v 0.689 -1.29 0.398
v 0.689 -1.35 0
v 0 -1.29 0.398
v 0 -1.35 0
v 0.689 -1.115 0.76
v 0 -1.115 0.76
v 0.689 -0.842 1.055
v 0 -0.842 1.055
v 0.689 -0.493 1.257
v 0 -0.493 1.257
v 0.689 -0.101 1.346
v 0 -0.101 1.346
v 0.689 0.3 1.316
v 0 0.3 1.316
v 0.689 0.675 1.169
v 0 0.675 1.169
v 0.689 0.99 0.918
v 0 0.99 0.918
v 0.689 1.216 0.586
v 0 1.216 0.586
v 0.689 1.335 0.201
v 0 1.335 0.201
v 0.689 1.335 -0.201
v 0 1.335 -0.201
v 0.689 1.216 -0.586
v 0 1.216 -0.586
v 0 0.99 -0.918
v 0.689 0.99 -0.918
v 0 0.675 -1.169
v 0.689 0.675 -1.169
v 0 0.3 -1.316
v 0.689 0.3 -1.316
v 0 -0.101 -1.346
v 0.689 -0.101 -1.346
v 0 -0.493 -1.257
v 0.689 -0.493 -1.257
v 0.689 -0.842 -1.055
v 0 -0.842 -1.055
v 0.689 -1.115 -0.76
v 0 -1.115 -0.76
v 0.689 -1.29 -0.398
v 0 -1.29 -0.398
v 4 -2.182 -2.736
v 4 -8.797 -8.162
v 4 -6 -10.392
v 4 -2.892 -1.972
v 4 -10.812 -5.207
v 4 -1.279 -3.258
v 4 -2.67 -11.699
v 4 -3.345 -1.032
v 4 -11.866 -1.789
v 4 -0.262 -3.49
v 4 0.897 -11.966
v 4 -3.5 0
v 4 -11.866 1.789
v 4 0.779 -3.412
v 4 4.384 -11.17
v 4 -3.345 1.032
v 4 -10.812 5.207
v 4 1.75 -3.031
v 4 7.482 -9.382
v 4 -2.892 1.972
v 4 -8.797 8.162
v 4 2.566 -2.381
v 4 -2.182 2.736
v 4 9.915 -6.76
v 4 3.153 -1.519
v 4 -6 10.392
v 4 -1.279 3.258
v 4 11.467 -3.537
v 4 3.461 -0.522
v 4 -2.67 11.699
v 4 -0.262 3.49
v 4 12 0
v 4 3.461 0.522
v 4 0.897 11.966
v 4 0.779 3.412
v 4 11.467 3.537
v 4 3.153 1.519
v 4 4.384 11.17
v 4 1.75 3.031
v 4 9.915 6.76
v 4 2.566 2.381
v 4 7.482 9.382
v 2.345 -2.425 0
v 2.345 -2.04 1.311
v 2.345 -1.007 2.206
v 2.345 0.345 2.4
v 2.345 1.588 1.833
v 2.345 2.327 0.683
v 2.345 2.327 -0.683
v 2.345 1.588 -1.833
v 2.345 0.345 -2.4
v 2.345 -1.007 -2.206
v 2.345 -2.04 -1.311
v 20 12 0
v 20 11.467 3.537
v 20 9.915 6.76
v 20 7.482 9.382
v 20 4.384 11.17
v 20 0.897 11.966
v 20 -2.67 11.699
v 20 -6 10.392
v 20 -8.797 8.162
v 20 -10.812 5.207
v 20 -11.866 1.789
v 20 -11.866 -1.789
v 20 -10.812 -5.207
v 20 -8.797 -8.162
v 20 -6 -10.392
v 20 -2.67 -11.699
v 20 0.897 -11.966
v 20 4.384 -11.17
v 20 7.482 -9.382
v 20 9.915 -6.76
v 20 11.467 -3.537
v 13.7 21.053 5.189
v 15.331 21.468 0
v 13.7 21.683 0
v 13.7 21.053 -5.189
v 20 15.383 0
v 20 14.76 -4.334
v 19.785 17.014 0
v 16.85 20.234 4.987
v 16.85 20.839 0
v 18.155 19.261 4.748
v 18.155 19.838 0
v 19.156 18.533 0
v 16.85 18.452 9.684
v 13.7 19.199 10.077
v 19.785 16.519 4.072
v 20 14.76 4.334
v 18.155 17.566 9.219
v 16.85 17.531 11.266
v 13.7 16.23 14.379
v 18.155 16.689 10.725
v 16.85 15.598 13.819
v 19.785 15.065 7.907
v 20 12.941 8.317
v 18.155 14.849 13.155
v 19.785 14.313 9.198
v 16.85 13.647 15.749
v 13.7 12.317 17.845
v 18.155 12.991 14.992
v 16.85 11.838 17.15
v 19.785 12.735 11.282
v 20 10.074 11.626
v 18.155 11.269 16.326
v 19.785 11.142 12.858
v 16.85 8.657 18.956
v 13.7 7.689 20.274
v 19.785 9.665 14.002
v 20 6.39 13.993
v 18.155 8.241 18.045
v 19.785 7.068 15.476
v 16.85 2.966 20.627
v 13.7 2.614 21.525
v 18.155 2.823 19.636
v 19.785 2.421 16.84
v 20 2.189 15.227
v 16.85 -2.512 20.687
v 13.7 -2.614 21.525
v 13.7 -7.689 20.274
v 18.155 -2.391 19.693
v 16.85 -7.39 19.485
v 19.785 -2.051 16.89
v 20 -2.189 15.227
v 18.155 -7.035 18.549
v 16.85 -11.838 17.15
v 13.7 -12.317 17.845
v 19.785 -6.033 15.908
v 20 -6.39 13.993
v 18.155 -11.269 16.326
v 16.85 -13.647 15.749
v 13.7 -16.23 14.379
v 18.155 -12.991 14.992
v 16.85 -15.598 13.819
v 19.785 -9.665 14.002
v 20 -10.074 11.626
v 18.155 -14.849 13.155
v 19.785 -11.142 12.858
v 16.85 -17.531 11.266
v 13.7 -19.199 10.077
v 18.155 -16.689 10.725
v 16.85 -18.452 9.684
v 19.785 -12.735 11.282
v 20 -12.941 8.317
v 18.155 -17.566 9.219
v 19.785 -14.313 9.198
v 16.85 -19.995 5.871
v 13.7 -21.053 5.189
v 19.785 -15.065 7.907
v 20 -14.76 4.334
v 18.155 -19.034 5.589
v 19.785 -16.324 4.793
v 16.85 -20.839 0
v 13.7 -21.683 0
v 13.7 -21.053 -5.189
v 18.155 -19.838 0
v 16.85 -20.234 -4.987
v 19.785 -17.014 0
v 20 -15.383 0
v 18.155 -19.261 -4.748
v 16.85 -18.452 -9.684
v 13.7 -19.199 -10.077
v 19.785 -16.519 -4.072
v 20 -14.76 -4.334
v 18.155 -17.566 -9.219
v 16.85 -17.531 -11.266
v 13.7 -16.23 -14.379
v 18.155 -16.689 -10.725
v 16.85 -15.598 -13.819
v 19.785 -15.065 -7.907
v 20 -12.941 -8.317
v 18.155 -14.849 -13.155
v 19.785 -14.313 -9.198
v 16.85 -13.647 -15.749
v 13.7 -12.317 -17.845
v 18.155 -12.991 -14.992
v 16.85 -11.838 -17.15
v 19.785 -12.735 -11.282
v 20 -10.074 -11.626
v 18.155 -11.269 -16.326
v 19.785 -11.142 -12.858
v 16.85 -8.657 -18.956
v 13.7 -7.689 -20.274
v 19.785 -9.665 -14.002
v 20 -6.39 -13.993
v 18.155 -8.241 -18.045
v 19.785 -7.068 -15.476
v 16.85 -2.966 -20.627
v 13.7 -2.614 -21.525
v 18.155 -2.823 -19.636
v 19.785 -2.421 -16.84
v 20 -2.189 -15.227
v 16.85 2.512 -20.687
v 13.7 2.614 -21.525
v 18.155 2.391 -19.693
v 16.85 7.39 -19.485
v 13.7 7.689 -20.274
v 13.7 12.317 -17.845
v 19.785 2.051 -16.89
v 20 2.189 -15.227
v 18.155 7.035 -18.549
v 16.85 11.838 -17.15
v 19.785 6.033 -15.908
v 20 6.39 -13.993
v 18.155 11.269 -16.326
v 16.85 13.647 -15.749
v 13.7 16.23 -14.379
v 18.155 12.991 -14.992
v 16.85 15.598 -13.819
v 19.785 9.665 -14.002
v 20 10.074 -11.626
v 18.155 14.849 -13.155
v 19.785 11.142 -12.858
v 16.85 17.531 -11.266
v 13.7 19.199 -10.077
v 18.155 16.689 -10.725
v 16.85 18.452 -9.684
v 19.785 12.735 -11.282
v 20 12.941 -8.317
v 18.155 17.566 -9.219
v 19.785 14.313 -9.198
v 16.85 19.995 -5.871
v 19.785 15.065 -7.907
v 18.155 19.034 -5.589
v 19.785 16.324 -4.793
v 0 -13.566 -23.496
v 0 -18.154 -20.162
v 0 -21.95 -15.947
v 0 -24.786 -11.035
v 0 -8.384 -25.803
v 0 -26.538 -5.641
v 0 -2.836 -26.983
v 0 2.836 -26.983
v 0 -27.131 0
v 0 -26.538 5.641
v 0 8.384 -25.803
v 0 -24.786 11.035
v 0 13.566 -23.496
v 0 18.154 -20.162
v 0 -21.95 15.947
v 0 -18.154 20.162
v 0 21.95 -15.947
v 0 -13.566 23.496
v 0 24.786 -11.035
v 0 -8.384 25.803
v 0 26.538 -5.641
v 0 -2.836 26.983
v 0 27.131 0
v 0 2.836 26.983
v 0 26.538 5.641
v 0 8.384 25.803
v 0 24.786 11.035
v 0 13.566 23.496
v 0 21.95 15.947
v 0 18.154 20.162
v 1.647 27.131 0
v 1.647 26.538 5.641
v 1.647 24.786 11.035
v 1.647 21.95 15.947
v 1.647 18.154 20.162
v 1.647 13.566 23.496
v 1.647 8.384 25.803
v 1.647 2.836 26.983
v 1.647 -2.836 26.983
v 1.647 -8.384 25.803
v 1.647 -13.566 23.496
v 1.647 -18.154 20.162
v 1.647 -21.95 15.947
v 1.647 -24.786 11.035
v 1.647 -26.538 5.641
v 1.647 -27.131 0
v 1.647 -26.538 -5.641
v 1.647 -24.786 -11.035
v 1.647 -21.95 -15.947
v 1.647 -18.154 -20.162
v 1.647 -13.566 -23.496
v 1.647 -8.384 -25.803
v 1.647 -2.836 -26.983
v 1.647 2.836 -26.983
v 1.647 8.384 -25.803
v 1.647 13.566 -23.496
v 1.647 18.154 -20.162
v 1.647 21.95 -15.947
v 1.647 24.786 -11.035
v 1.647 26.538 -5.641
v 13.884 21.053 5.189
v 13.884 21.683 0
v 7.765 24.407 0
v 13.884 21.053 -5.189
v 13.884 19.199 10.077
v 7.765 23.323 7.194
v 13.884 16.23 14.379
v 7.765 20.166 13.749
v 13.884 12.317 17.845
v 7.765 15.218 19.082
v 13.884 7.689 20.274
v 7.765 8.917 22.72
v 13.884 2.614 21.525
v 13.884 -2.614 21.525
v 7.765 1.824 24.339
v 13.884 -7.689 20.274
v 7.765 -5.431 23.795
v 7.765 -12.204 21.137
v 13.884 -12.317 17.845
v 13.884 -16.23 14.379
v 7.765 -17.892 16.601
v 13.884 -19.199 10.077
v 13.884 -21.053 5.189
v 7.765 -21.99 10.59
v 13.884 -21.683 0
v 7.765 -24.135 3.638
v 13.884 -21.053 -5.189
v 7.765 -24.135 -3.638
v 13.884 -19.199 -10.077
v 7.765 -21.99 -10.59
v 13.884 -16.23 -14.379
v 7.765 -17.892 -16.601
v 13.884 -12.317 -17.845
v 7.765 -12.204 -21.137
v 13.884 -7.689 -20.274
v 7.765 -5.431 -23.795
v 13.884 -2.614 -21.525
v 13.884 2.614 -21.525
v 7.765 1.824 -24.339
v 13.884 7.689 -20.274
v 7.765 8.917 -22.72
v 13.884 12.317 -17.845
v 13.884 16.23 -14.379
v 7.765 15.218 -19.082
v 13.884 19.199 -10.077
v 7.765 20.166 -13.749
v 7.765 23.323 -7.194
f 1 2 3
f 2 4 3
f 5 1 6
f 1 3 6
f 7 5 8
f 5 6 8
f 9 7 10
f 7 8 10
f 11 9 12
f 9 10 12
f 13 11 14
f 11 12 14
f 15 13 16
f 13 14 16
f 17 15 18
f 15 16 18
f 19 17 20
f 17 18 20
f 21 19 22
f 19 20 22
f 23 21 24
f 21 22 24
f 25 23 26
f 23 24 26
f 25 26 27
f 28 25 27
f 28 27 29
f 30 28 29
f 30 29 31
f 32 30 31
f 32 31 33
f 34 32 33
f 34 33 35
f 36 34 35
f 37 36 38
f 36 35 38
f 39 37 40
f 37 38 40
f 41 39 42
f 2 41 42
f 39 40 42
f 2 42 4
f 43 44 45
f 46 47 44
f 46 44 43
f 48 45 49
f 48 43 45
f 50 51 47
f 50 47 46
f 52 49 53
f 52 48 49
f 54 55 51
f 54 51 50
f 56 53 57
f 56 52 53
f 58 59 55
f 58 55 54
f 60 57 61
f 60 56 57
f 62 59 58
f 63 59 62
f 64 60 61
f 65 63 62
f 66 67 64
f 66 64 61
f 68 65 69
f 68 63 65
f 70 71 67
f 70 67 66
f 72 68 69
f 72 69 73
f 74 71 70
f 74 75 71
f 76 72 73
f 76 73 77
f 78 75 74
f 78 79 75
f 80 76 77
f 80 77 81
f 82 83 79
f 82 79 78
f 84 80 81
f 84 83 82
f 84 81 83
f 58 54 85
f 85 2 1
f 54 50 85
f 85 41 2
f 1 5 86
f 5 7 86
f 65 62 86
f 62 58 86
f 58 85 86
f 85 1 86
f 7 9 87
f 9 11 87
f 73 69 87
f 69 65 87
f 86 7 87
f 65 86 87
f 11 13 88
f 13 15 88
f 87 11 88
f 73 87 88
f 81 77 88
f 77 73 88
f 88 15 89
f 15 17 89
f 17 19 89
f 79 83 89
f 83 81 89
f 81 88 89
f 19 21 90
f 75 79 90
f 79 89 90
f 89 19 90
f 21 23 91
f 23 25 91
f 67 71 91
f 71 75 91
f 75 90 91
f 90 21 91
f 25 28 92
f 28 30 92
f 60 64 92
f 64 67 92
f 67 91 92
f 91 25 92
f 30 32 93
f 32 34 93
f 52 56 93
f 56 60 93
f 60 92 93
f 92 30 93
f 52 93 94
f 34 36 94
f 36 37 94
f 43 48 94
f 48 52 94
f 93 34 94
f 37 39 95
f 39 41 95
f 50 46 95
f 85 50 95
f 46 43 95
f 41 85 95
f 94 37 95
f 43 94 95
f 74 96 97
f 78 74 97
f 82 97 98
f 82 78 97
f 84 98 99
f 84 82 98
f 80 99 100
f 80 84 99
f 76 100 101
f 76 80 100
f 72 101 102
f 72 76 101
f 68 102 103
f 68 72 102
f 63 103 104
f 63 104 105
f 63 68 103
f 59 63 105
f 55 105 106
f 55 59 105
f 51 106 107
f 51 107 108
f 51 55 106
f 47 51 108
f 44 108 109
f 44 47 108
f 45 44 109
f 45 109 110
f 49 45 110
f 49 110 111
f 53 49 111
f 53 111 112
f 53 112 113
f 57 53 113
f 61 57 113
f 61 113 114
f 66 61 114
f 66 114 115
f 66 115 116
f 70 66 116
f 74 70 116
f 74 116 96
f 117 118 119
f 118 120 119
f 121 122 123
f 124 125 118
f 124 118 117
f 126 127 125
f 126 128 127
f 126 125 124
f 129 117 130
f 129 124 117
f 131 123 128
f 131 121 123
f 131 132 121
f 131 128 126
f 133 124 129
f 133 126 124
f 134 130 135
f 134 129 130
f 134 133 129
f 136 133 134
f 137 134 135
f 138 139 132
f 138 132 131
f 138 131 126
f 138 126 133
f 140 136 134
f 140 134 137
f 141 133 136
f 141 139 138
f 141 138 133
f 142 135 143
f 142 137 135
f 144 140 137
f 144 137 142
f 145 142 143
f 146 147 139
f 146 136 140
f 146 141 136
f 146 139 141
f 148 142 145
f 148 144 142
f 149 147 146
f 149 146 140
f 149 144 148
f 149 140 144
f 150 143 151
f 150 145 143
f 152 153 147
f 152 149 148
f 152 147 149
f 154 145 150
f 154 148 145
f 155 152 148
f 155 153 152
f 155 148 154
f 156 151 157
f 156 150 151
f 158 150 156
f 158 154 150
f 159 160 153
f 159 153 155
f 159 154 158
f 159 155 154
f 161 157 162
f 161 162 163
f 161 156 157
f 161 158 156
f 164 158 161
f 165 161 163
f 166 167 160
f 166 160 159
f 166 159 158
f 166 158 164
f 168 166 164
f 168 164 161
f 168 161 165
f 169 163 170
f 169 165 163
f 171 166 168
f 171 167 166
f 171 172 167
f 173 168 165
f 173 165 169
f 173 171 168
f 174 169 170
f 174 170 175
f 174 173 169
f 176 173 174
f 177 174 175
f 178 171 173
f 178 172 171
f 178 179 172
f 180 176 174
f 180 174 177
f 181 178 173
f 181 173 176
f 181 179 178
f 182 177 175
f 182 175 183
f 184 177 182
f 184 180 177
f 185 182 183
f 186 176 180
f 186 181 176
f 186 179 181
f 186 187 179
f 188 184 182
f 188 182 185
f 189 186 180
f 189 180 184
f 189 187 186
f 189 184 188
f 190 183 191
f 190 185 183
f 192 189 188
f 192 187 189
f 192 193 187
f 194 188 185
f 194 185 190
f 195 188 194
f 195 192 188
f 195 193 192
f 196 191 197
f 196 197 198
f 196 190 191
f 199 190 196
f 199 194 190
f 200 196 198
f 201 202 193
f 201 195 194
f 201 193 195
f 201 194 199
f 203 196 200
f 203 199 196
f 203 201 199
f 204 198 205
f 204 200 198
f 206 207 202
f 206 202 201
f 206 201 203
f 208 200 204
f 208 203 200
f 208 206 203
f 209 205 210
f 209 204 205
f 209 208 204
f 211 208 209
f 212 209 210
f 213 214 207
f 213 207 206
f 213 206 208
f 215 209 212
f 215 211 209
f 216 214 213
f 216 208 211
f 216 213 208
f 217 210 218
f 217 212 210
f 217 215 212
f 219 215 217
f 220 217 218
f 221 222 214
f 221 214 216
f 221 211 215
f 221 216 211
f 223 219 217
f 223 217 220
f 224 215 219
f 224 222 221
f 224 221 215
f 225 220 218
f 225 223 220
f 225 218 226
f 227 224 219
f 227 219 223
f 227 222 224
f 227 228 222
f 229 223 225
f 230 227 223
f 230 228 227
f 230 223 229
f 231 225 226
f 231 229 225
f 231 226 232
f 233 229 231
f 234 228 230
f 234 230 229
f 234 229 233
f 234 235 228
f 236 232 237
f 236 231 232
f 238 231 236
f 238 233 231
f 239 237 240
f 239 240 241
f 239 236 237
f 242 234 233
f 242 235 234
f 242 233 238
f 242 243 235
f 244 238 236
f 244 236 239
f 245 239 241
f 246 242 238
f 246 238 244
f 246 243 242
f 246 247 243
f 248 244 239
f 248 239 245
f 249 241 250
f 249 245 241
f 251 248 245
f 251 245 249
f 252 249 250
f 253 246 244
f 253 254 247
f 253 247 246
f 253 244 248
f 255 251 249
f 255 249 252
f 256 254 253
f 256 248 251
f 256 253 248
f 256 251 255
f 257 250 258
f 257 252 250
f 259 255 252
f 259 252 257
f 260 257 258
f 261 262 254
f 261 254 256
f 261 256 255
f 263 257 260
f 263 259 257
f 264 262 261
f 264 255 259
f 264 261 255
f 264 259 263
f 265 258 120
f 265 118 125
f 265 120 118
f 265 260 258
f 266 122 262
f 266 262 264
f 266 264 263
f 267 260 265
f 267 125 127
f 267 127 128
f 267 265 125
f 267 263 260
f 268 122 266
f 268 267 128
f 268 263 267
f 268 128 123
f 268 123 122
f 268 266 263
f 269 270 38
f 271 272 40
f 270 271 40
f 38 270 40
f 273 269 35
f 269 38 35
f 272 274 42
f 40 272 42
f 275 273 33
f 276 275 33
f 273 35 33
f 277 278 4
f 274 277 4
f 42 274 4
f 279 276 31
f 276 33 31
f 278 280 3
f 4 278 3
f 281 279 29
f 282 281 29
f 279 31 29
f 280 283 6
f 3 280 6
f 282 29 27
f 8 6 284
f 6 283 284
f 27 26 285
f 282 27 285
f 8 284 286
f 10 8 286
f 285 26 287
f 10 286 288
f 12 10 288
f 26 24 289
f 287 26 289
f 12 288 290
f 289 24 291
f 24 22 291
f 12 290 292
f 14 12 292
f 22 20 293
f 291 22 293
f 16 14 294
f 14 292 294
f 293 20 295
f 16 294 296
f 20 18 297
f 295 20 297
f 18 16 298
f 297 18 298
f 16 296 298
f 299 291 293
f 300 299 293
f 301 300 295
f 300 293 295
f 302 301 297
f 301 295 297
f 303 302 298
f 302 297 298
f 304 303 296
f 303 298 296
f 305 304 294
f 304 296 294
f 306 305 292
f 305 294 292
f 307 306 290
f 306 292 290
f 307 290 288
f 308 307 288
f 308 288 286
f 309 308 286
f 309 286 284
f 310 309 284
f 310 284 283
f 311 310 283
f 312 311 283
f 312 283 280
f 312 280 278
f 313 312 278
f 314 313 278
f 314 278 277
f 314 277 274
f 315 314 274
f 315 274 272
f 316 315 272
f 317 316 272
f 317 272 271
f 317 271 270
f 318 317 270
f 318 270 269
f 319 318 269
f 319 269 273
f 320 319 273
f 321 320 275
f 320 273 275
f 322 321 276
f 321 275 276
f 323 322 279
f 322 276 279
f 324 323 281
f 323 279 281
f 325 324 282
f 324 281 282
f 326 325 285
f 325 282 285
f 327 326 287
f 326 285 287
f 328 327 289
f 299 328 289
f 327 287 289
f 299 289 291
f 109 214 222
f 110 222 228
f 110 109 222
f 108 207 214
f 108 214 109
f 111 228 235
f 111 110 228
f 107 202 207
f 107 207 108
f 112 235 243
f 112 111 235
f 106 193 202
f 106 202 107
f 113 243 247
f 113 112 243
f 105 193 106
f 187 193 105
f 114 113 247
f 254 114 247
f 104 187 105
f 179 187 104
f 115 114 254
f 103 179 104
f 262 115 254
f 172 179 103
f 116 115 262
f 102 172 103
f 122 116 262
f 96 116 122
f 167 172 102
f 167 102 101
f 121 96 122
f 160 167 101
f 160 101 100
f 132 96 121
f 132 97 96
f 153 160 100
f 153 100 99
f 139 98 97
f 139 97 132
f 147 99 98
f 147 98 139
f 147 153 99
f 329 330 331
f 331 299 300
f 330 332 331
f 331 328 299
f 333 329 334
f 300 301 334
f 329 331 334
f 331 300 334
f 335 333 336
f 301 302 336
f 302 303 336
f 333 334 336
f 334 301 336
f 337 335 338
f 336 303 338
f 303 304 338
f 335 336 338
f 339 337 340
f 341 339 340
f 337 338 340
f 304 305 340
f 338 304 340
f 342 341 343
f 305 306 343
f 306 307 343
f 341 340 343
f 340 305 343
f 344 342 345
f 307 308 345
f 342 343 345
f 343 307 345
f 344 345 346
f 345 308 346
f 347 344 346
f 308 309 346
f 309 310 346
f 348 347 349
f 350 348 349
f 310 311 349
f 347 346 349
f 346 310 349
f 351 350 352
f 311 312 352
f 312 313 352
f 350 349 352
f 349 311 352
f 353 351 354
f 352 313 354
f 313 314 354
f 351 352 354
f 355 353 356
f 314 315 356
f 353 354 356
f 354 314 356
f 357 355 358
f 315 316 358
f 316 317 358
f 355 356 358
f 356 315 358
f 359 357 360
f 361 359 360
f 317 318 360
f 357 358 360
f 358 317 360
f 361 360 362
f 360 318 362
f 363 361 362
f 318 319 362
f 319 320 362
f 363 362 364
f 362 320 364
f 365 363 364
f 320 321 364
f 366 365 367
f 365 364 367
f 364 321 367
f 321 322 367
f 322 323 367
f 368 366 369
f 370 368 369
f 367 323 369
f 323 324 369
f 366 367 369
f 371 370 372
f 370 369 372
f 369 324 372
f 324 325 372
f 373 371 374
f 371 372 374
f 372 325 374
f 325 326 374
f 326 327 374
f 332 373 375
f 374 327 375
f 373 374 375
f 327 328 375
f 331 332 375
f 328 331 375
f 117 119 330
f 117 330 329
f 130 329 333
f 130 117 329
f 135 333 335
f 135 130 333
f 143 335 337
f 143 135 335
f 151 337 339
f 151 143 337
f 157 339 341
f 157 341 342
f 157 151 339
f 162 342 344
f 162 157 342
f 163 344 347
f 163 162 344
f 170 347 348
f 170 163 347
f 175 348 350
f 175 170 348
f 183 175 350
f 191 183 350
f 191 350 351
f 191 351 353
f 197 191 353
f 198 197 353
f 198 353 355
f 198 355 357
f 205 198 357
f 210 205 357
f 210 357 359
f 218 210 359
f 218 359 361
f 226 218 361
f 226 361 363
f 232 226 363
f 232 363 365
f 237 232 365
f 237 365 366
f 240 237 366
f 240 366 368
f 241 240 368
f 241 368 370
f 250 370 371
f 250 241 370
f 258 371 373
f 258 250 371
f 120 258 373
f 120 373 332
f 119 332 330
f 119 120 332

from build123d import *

# Parameters (mm, degrees)
F0_R           = 15.1824843522
F0_R_2         = 12
F1_DEPTH       = 20
F0_R_3         = 21.6830909865
F2_DEPTH       = 20
F3_R           = 6.3
F0_R_4         = 27.1312843312
F4_DEPTH       = 14
F5_S5_R        = 21.6830909865
F5_T6_DEPTH    = 40
F0_R_5         = 1.775
F6_DEPTH       = 4
F8_D           = 2.7
F8_DEPTH       = 12
F8_CSINK_D     = 7
F8_CSINK_ANGLE = 66
F8_TIP         = 0.8111618357


# Not quite as in the source:
# - a fillet or chamfer that OpenCascade refuses, or shapes differently, is made with other operations: its cross-section is extruded or revolved along the edge and cut away or added


with BuildPart() as f1:
    # F0 (on Right) → F1 (new body)
    with BuildSketch(Plane.YZ):
        Circle(F0_R)
        Circle(F0_R_2, mode=Mode.SUBTRACT)
    extrude(amount=F1_DEPTH)

    # F0 (on Right) → F2 (join)
    with BuildSketch(Plane.YZ):
        Circle(F0_R_3)
        Circle(F0_R, mode=Mode.SUBTRACT)
    extrude(amount=F2_DEPTH)

    # F3
    f3_edges = [f1.edges().sort_by_distance(p)[0] for p in [
        (20, -21.683091, 0),
    ]]
    fillet(f3_edges, radius=F3_R)

    # F0 (on Right) → F4 (join)
    with BuildSketch(Plane.YZ):
        Circle(F0_R_4)
        Circle(F0_R_3, mode=Mode.SUBTRACT)
    extrude(amount=F4_DEPTH)

    # F5: chamfer of 5.5 x 12.3532022565 on 1 edges, made by hand


with BuildPart() as f5_tool2:
    # F5_s3 → F5_t4 (revolve)
    with BuildSketch(Plane.XY):
        Polygon((14, 21.6312843312), (1.6467977435, 27.1312843312), (14, 27.1312843312), align=None)
    revolve(axis=Axis((14, 0, 0), (1, 0, 0)))

    # F5_s5 → F5_t6 (cut, symmetric)
    with BuildSketch(Plane.YZ.offset(7.8)):
        Circle(F5_S5_R)
    extrude(amount=F5_T6_DEPTH, both=True, mode=Mode.SUBTRACT)


with BuildPart() as f1_1:
    add(f1.part)

    # F5_t1: cut F5_tool2
    add(f5_tool2.part, mode=Mode.SUBTRACT)

    # F0 (on Right) → F6 (join)
    with BuildSketch(Plane.YZ):
        Circle(F0_R_2)
        Circle(F0_R_5, mode=Mode.SUBTRACT)
        Circle(F0_R_5)
    extrude(amount=F6_DEPTH)

    # F8
    with Locations(Plane.YZ.offset(4)):
        with Locations((0, 0)):
            CounterSinkHole(F8_D / 2, F8_CSINK_D / 2, depth=F8_DEPTH, counter_sink_angle=F8_CSINK_ANGLE)
            with Locations((0, 0, -(F8_DEPTH + F8_TIP / 2))):  # 118° drill point
                Cone(0, F8_D / 2, F8_TIP, mode=Mode.SUBTRACT)


solid = f1_1.part
